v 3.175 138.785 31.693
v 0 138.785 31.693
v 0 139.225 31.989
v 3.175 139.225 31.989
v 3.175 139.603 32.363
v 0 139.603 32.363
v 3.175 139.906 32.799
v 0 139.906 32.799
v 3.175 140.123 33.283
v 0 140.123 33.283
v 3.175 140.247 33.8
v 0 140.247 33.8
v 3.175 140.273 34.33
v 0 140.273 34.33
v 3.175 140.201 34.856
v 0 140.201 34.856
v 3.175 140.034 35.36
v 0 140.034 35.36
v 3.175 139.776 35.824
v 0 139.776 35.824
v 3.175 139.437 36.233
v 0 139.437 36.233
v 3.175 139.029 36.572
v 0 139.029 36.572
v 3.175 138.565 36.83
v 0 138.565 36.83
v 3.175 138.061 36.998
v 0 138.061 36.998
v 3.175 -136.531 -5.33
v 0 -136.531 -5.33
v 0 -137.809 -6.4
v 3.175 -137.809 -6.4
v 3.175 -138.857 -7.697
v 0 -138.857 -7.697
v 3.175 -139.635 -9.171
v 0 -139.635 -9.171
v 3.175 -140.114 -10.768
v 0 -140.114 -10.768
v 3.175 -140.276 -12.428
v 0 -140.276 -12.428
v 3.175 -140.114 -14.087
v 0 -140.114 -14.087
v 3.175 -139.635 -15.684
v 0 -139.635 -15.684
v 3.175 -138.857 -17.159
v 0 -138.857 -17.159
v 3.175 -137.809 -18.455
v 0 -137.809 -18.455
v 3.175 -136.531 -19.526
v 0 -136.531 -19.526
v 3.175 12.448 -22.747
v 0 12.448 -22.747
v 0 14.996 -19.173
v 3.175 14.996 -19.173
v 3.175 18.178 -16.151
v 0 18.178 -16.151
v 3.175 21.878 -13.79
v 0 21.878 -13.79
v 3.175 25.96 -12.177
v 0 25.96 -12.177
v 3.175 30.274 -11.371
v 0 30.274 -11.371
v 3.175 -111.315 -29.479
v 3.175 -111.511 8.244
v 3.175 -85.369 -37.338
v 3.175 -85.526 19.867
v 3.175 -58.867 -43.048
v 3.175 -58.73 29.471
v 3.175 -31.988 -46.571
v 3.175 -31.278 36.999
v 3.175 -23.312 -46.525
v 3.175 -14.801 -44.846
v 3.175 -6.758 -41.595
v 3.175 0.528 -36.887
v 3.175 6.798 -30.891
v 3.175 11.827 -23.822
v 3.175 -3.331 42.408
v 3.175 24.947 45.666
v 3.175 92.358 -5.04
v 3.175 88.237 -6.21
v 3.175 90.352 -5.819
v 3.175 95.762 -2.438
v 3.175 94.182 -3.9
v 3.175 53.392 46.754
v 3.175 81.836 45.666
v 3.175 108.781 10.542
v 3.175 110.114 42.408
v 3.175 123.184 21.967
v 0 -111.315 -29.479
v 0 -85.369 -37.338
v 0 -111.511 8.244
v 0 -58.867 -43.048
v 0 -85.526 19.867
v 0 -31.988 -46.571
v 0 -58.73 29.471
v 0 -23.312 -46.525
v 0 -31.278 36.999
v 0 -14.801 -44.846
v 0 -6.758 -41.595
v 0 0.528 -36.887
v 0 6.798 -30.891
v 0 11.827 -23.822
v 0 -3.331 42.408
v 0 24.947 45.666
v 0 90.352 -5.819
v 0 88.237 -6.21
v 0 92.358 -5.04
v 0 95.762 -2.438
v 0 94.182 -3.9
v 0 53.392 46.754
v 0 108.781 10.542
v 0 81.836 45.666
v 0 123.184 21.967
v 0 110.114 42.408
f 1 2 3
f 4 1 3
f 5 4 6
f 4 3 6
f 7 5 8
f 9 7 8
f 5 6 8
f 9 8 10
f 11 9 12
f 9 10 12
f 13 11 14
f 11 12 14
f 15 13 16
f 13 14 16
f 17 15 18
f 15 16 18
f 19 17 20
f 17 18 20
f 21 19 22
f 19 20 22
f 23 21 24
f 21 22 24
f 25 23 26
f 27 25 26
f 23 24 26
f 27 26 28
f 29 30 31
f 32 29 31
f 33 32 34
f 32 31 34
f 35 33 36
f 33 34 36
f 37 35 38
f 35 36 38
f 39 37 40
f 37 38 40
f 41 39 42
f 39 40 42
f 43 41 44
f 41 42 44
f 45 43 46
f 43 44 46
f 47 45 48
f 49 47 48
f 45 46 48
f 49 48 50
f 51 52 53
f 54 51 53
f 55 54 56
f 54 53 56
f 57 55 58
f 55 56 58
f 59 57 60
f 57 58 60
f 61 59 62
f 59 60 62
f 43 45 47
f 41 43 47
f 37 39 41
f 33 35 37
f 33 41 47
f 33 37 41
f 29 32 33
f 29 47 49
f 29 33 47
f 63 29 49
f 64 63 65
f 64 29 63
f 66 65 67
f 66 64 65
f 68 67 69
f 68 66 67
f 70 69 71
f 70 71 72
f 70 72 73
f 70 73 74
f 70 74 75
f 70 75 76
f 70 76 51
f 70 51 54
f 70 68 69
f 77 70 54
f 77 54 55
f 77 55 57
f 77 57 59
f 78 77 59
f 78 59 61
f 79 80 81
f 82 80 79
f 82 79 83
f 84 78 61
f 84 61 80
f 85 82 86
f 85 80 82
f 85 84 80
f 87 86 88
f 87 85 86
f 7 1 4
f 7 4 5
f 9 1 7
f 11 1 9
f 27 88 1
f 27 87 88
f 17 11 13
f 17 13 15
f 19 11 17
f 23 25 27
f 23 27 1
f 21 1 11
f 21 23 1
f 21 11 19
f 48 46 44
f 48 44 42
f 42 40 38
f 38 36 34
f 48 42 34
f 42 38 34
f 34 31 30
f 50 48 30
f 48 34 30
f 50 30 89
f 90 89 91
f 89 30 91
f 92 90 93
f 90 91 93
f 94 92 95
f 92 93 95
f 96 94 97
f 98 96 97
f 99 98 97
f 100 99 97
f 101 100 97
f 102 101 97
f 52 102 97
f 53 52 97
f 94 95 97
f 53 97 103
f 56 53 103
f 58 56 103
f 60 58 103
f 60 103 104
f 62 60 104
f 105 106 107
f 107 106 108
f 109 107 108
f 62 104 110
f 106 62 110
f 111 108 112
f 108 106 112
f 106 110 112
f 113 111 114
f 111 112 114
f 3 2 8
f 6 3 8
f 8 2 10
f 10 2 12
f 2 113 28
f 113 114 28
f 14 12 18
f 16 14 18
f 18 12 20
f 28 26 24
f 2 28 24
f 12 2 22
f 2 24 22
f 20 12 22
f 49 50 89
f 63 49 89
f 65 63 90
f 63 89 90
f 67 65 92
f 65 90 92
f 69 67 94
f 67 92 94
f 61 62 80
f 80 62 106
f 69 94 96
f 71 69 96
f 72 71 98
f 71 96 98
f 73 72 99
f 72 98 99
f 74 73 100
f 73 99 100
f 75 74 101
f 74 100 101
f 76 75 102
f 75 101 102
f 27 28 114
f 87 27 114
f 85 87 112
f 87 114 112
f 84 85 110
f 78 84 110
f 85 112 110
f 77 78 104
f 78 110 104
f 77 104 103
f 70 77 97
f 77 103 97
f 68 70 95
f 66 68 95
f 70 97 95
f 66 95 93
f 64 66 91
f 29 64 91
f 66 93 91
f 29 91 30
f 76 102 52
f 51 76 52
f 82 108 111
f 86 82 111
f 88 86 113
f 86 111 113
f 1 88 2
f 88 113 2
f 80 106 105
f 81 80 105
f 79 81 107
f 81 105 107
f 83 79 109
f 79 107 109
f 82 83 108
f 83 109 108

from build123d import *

# Parameters (mm, degrees)
F1_DEPTH = 3.175


# Not quite as in the source:
# - ends of sketch curves that miss each other by under 0.0002 mm in the source are joined


with BuildPart() as f1:
    # F0 (on Right) → F1 (new body)
    with BuildSketch(Plane.YZ):
        with BuildLine():
            ThreePointArc((95.7616986955, -2.4384445977), (115.8206686741, 16.458433146), (138.7853580017, 31.6925169435))
            ThreePointArc((138.7853580017, 31.6925169435), (140.2492541442, 34.5947643313), (138.0609974389, 36.9984236581))
            ThreePointArc((138.0609974389, 36.9984236581), (-3.331363766, 42.4083585784), (-136.5310363288, -5.3296204889))
            ThreePointArc((-136.5310363288, -5.3296204889), (-140.275599037, -12.4275830619), (-136.5310425411, -19.5255553241))
            ThreePointArc((-136.5310425411, -19.5255553241), (-85.3689517348, -37.3376085714), (-31.987598638, -46.5712291765))
            ThreePointArc((-31.987598638, -46.5712291765), (-6.7583016255, -41.5949042645), (11.8270849627, -23.8223232356))
            Line((11.8270849627, -23.8223232356), (12.4481411913, -22.7466161766))
            ThreePointArc((12.4481411913, -22.7466161766), (19.971713381, -14.8813600309), (30.2742956681, -11.3709138521))
            Line((30.2742956681, -11.3709138521), (88.2365367651, -6.2104608931))
            ThreePointArc((88.2365367651, -6.2104608931), (92.3577760693, -5.0399785829), (95.7616986955, -2.4384445977))
        make_face()
    extrude(amount=F1_DEPTH)


solid = f1.part
